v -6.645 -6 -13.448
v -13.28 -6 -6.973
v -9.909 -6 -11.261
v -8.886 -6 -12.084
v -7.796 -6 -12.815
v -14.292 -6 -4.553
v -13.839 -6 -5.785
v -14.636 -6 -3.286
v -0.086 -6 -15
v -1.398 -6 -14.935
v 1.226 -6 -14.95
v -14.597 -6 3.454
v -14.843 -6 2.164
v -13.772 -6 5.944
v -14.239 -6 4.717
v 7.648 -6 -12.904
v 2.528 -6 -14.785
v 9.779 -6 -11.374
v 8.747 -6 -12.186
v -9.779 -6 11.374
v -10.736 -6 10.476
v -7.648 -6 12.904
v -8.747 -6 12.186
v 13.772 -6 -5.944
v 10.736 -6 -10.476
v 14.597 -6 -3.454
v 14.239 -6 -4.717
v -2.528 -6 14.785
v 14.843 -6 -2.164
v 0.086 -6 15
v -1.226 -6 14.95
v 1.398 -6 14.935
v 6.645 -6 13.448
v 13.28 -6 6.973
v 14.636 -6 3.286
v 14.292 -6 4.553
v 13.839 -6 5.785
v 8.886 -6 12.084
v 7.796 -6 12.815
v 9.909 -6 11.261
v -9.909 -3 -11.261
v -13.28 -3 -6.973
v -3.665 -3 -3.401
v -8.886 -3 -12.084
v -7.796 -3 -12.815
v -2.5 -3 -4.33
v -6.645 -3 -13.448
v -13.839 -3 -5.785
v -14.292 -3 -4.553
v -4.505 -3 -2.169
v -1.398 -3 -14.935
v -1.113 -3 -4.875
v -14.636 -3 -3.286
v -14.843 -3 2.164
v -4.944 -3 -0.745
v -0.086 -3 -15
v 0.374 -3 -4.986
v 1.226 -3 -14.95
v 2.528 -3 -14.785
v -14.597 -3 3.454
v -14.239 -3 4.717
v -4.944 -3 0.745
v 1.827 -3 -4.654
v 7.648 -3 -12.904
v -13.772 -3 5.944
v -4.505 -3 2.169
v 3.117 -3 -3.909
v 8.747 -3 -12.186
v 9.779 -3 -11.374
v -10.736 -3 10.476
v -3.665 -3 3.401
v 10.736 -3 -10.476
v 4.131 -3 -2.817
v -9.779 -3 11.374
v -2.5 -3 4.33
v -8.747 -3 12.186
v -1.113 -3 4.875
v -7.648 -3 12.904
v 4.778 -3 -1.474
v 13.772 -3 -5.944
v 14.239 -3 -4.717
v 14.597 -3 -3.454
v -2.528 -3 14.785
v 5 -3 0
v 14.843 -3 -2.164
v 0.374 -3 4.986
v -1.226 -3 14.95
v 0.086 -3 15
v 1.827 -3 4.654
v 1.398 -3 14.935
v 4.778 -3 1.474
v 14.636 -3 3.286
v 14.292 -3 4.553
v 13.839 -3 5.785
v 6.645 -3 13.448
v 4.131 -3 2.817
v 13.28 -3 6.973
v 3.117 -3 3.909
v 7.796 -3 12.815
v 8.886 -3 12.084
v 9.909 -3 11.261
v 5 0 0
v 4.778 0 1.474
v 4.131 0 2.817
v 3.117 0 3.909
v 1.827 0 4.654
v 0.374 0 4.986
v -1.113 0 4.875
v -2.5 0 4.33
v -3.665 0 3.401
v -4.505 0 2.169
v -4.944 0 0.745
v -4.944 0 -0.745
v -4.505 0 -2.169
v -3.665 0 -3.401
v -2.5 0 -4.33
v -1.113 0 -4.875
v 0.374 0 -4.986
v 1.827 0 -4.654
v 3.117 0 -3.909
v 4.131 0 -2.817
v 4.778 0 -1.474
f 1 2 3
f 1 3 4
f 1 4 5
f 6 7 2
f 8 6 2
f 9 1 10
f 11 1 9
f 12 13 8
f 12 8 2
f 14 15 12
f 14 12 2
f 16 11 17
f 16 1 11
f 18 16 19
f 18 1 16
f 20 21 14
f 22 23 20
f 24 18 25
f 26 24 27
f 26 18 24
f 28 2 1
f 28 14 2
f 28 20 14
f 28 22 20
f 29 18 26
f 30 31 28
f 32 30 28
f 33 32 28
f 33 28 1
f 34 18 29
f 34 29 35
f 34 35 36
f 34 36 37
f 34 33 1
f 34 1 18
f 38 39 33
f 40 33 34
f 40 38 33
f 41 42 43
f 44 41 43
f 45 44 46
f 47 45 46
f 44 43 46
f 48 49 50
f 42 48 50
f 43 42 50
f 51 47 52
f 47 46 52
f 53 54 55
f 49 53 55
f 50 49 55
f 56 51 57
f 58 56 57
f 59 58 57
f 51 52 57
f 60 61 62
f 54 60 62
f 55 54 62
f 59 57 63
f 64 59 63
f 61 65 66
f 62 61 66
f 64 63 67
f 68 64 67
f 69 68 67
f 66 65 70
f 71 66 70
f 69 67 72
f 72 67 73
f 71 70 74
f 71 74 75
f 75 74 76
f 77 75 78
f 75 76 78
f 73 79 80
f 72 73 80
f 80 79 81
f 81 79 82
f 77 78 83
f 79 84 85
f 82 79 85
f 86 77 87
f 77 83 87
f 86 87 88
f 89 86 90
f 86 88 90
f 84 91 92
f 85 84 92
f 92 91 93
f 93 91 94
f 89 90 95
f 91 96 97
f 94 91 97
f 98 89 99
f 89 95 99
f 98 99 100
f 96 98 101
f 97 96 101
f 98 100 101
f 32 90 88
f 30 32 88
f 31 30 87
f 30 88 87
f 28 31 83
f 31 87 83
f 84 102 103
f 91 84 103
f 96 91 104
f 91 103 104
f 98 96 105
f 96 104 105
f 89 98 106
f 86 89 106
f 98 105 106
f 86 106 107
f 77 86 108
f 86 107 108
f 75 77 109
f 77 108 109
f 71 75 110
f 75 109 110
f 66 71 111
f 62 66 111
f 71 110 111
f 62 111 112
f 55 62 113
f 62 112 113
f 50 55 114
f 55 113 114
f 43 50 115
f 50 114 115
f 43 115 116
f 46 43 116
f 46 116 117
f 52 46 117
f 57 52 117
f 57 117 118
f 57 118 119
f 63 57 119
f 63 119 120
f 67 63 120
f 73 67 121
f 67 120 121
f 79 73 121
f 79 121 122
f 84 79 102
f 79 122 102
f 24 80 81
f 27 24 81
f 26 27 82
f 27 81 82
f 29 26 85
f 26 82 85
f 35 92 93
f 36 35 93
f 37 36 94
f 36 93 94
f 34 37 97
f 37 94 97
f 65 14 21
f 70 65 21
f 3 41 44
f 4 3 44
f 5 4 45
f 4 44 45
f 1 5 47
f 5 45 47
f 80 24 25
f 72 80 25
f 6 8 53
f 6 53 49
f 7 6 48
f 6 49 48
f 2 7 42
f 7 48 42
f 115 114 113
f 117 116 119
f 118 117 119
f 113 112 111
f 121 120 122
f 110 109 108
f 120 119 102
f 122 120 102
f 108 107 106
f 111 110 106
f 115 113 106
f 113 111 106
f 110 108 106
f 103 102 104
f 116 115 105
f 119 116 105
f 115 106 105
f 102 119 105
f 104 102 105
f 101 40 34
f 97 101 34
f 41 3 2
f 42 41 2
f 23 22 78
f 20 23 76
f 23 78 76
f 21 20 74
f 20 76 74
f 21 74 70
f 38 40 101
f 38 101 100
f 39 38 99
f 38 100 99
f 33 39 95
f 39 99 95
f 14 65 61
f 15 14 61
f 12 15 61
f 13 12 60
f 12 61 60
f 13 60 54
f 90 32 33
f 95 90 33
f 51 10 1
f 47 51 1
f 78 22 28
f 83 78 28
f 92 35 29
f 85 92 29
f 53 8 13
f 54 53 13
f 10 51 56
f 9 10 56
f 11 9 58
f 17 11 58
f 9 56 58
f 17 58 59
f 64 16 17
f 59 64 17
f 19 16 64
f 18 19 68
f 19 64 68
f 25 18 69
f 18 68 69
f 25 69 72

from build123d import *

# Parameters (mm, degrees)
F0_R     = 5
F1_DEPTH = 3
F2_R     = 15
F3_DEPTH = 3
F4_R     = 17.221585
F5_DEPTH = 25


with BuildPart() as f1:
    # F0 (on Front) → F1 (new body)
    with BuildSketch(Plane.XZ):
        Circle(F0_R)
    extrude(amount=F1_DEPTH)

    # F2 (on face) → F3 (join)
    with BuildSketch(Plane.XZ.offset(3)):
        Circle(F2_R)
    extrude(amount=F3_DEPTH)

    # F4 (on face) → F5 (cut)
    with BuildSketch(Plane.XZ.offset(6)):
        Circle(F4_R)
        Polygon((-9.586422, 12.19146), (-0.589618, 15.497856), (8.6324, 12.884598), (14.557135, 5.349861), (14.921539, -4.228341), (9.586422, -12.19146), (0.589618, -15.497856), (-8.6324, -12.884598), (-14.557135, -5.349861), (-14.921539, 4.228341), align=None, mode=Mode.SUBTRACT)
    extrude(amount=-F5_DEPTH, mode=Mode.SUBTRACT)


solid = f1.part
